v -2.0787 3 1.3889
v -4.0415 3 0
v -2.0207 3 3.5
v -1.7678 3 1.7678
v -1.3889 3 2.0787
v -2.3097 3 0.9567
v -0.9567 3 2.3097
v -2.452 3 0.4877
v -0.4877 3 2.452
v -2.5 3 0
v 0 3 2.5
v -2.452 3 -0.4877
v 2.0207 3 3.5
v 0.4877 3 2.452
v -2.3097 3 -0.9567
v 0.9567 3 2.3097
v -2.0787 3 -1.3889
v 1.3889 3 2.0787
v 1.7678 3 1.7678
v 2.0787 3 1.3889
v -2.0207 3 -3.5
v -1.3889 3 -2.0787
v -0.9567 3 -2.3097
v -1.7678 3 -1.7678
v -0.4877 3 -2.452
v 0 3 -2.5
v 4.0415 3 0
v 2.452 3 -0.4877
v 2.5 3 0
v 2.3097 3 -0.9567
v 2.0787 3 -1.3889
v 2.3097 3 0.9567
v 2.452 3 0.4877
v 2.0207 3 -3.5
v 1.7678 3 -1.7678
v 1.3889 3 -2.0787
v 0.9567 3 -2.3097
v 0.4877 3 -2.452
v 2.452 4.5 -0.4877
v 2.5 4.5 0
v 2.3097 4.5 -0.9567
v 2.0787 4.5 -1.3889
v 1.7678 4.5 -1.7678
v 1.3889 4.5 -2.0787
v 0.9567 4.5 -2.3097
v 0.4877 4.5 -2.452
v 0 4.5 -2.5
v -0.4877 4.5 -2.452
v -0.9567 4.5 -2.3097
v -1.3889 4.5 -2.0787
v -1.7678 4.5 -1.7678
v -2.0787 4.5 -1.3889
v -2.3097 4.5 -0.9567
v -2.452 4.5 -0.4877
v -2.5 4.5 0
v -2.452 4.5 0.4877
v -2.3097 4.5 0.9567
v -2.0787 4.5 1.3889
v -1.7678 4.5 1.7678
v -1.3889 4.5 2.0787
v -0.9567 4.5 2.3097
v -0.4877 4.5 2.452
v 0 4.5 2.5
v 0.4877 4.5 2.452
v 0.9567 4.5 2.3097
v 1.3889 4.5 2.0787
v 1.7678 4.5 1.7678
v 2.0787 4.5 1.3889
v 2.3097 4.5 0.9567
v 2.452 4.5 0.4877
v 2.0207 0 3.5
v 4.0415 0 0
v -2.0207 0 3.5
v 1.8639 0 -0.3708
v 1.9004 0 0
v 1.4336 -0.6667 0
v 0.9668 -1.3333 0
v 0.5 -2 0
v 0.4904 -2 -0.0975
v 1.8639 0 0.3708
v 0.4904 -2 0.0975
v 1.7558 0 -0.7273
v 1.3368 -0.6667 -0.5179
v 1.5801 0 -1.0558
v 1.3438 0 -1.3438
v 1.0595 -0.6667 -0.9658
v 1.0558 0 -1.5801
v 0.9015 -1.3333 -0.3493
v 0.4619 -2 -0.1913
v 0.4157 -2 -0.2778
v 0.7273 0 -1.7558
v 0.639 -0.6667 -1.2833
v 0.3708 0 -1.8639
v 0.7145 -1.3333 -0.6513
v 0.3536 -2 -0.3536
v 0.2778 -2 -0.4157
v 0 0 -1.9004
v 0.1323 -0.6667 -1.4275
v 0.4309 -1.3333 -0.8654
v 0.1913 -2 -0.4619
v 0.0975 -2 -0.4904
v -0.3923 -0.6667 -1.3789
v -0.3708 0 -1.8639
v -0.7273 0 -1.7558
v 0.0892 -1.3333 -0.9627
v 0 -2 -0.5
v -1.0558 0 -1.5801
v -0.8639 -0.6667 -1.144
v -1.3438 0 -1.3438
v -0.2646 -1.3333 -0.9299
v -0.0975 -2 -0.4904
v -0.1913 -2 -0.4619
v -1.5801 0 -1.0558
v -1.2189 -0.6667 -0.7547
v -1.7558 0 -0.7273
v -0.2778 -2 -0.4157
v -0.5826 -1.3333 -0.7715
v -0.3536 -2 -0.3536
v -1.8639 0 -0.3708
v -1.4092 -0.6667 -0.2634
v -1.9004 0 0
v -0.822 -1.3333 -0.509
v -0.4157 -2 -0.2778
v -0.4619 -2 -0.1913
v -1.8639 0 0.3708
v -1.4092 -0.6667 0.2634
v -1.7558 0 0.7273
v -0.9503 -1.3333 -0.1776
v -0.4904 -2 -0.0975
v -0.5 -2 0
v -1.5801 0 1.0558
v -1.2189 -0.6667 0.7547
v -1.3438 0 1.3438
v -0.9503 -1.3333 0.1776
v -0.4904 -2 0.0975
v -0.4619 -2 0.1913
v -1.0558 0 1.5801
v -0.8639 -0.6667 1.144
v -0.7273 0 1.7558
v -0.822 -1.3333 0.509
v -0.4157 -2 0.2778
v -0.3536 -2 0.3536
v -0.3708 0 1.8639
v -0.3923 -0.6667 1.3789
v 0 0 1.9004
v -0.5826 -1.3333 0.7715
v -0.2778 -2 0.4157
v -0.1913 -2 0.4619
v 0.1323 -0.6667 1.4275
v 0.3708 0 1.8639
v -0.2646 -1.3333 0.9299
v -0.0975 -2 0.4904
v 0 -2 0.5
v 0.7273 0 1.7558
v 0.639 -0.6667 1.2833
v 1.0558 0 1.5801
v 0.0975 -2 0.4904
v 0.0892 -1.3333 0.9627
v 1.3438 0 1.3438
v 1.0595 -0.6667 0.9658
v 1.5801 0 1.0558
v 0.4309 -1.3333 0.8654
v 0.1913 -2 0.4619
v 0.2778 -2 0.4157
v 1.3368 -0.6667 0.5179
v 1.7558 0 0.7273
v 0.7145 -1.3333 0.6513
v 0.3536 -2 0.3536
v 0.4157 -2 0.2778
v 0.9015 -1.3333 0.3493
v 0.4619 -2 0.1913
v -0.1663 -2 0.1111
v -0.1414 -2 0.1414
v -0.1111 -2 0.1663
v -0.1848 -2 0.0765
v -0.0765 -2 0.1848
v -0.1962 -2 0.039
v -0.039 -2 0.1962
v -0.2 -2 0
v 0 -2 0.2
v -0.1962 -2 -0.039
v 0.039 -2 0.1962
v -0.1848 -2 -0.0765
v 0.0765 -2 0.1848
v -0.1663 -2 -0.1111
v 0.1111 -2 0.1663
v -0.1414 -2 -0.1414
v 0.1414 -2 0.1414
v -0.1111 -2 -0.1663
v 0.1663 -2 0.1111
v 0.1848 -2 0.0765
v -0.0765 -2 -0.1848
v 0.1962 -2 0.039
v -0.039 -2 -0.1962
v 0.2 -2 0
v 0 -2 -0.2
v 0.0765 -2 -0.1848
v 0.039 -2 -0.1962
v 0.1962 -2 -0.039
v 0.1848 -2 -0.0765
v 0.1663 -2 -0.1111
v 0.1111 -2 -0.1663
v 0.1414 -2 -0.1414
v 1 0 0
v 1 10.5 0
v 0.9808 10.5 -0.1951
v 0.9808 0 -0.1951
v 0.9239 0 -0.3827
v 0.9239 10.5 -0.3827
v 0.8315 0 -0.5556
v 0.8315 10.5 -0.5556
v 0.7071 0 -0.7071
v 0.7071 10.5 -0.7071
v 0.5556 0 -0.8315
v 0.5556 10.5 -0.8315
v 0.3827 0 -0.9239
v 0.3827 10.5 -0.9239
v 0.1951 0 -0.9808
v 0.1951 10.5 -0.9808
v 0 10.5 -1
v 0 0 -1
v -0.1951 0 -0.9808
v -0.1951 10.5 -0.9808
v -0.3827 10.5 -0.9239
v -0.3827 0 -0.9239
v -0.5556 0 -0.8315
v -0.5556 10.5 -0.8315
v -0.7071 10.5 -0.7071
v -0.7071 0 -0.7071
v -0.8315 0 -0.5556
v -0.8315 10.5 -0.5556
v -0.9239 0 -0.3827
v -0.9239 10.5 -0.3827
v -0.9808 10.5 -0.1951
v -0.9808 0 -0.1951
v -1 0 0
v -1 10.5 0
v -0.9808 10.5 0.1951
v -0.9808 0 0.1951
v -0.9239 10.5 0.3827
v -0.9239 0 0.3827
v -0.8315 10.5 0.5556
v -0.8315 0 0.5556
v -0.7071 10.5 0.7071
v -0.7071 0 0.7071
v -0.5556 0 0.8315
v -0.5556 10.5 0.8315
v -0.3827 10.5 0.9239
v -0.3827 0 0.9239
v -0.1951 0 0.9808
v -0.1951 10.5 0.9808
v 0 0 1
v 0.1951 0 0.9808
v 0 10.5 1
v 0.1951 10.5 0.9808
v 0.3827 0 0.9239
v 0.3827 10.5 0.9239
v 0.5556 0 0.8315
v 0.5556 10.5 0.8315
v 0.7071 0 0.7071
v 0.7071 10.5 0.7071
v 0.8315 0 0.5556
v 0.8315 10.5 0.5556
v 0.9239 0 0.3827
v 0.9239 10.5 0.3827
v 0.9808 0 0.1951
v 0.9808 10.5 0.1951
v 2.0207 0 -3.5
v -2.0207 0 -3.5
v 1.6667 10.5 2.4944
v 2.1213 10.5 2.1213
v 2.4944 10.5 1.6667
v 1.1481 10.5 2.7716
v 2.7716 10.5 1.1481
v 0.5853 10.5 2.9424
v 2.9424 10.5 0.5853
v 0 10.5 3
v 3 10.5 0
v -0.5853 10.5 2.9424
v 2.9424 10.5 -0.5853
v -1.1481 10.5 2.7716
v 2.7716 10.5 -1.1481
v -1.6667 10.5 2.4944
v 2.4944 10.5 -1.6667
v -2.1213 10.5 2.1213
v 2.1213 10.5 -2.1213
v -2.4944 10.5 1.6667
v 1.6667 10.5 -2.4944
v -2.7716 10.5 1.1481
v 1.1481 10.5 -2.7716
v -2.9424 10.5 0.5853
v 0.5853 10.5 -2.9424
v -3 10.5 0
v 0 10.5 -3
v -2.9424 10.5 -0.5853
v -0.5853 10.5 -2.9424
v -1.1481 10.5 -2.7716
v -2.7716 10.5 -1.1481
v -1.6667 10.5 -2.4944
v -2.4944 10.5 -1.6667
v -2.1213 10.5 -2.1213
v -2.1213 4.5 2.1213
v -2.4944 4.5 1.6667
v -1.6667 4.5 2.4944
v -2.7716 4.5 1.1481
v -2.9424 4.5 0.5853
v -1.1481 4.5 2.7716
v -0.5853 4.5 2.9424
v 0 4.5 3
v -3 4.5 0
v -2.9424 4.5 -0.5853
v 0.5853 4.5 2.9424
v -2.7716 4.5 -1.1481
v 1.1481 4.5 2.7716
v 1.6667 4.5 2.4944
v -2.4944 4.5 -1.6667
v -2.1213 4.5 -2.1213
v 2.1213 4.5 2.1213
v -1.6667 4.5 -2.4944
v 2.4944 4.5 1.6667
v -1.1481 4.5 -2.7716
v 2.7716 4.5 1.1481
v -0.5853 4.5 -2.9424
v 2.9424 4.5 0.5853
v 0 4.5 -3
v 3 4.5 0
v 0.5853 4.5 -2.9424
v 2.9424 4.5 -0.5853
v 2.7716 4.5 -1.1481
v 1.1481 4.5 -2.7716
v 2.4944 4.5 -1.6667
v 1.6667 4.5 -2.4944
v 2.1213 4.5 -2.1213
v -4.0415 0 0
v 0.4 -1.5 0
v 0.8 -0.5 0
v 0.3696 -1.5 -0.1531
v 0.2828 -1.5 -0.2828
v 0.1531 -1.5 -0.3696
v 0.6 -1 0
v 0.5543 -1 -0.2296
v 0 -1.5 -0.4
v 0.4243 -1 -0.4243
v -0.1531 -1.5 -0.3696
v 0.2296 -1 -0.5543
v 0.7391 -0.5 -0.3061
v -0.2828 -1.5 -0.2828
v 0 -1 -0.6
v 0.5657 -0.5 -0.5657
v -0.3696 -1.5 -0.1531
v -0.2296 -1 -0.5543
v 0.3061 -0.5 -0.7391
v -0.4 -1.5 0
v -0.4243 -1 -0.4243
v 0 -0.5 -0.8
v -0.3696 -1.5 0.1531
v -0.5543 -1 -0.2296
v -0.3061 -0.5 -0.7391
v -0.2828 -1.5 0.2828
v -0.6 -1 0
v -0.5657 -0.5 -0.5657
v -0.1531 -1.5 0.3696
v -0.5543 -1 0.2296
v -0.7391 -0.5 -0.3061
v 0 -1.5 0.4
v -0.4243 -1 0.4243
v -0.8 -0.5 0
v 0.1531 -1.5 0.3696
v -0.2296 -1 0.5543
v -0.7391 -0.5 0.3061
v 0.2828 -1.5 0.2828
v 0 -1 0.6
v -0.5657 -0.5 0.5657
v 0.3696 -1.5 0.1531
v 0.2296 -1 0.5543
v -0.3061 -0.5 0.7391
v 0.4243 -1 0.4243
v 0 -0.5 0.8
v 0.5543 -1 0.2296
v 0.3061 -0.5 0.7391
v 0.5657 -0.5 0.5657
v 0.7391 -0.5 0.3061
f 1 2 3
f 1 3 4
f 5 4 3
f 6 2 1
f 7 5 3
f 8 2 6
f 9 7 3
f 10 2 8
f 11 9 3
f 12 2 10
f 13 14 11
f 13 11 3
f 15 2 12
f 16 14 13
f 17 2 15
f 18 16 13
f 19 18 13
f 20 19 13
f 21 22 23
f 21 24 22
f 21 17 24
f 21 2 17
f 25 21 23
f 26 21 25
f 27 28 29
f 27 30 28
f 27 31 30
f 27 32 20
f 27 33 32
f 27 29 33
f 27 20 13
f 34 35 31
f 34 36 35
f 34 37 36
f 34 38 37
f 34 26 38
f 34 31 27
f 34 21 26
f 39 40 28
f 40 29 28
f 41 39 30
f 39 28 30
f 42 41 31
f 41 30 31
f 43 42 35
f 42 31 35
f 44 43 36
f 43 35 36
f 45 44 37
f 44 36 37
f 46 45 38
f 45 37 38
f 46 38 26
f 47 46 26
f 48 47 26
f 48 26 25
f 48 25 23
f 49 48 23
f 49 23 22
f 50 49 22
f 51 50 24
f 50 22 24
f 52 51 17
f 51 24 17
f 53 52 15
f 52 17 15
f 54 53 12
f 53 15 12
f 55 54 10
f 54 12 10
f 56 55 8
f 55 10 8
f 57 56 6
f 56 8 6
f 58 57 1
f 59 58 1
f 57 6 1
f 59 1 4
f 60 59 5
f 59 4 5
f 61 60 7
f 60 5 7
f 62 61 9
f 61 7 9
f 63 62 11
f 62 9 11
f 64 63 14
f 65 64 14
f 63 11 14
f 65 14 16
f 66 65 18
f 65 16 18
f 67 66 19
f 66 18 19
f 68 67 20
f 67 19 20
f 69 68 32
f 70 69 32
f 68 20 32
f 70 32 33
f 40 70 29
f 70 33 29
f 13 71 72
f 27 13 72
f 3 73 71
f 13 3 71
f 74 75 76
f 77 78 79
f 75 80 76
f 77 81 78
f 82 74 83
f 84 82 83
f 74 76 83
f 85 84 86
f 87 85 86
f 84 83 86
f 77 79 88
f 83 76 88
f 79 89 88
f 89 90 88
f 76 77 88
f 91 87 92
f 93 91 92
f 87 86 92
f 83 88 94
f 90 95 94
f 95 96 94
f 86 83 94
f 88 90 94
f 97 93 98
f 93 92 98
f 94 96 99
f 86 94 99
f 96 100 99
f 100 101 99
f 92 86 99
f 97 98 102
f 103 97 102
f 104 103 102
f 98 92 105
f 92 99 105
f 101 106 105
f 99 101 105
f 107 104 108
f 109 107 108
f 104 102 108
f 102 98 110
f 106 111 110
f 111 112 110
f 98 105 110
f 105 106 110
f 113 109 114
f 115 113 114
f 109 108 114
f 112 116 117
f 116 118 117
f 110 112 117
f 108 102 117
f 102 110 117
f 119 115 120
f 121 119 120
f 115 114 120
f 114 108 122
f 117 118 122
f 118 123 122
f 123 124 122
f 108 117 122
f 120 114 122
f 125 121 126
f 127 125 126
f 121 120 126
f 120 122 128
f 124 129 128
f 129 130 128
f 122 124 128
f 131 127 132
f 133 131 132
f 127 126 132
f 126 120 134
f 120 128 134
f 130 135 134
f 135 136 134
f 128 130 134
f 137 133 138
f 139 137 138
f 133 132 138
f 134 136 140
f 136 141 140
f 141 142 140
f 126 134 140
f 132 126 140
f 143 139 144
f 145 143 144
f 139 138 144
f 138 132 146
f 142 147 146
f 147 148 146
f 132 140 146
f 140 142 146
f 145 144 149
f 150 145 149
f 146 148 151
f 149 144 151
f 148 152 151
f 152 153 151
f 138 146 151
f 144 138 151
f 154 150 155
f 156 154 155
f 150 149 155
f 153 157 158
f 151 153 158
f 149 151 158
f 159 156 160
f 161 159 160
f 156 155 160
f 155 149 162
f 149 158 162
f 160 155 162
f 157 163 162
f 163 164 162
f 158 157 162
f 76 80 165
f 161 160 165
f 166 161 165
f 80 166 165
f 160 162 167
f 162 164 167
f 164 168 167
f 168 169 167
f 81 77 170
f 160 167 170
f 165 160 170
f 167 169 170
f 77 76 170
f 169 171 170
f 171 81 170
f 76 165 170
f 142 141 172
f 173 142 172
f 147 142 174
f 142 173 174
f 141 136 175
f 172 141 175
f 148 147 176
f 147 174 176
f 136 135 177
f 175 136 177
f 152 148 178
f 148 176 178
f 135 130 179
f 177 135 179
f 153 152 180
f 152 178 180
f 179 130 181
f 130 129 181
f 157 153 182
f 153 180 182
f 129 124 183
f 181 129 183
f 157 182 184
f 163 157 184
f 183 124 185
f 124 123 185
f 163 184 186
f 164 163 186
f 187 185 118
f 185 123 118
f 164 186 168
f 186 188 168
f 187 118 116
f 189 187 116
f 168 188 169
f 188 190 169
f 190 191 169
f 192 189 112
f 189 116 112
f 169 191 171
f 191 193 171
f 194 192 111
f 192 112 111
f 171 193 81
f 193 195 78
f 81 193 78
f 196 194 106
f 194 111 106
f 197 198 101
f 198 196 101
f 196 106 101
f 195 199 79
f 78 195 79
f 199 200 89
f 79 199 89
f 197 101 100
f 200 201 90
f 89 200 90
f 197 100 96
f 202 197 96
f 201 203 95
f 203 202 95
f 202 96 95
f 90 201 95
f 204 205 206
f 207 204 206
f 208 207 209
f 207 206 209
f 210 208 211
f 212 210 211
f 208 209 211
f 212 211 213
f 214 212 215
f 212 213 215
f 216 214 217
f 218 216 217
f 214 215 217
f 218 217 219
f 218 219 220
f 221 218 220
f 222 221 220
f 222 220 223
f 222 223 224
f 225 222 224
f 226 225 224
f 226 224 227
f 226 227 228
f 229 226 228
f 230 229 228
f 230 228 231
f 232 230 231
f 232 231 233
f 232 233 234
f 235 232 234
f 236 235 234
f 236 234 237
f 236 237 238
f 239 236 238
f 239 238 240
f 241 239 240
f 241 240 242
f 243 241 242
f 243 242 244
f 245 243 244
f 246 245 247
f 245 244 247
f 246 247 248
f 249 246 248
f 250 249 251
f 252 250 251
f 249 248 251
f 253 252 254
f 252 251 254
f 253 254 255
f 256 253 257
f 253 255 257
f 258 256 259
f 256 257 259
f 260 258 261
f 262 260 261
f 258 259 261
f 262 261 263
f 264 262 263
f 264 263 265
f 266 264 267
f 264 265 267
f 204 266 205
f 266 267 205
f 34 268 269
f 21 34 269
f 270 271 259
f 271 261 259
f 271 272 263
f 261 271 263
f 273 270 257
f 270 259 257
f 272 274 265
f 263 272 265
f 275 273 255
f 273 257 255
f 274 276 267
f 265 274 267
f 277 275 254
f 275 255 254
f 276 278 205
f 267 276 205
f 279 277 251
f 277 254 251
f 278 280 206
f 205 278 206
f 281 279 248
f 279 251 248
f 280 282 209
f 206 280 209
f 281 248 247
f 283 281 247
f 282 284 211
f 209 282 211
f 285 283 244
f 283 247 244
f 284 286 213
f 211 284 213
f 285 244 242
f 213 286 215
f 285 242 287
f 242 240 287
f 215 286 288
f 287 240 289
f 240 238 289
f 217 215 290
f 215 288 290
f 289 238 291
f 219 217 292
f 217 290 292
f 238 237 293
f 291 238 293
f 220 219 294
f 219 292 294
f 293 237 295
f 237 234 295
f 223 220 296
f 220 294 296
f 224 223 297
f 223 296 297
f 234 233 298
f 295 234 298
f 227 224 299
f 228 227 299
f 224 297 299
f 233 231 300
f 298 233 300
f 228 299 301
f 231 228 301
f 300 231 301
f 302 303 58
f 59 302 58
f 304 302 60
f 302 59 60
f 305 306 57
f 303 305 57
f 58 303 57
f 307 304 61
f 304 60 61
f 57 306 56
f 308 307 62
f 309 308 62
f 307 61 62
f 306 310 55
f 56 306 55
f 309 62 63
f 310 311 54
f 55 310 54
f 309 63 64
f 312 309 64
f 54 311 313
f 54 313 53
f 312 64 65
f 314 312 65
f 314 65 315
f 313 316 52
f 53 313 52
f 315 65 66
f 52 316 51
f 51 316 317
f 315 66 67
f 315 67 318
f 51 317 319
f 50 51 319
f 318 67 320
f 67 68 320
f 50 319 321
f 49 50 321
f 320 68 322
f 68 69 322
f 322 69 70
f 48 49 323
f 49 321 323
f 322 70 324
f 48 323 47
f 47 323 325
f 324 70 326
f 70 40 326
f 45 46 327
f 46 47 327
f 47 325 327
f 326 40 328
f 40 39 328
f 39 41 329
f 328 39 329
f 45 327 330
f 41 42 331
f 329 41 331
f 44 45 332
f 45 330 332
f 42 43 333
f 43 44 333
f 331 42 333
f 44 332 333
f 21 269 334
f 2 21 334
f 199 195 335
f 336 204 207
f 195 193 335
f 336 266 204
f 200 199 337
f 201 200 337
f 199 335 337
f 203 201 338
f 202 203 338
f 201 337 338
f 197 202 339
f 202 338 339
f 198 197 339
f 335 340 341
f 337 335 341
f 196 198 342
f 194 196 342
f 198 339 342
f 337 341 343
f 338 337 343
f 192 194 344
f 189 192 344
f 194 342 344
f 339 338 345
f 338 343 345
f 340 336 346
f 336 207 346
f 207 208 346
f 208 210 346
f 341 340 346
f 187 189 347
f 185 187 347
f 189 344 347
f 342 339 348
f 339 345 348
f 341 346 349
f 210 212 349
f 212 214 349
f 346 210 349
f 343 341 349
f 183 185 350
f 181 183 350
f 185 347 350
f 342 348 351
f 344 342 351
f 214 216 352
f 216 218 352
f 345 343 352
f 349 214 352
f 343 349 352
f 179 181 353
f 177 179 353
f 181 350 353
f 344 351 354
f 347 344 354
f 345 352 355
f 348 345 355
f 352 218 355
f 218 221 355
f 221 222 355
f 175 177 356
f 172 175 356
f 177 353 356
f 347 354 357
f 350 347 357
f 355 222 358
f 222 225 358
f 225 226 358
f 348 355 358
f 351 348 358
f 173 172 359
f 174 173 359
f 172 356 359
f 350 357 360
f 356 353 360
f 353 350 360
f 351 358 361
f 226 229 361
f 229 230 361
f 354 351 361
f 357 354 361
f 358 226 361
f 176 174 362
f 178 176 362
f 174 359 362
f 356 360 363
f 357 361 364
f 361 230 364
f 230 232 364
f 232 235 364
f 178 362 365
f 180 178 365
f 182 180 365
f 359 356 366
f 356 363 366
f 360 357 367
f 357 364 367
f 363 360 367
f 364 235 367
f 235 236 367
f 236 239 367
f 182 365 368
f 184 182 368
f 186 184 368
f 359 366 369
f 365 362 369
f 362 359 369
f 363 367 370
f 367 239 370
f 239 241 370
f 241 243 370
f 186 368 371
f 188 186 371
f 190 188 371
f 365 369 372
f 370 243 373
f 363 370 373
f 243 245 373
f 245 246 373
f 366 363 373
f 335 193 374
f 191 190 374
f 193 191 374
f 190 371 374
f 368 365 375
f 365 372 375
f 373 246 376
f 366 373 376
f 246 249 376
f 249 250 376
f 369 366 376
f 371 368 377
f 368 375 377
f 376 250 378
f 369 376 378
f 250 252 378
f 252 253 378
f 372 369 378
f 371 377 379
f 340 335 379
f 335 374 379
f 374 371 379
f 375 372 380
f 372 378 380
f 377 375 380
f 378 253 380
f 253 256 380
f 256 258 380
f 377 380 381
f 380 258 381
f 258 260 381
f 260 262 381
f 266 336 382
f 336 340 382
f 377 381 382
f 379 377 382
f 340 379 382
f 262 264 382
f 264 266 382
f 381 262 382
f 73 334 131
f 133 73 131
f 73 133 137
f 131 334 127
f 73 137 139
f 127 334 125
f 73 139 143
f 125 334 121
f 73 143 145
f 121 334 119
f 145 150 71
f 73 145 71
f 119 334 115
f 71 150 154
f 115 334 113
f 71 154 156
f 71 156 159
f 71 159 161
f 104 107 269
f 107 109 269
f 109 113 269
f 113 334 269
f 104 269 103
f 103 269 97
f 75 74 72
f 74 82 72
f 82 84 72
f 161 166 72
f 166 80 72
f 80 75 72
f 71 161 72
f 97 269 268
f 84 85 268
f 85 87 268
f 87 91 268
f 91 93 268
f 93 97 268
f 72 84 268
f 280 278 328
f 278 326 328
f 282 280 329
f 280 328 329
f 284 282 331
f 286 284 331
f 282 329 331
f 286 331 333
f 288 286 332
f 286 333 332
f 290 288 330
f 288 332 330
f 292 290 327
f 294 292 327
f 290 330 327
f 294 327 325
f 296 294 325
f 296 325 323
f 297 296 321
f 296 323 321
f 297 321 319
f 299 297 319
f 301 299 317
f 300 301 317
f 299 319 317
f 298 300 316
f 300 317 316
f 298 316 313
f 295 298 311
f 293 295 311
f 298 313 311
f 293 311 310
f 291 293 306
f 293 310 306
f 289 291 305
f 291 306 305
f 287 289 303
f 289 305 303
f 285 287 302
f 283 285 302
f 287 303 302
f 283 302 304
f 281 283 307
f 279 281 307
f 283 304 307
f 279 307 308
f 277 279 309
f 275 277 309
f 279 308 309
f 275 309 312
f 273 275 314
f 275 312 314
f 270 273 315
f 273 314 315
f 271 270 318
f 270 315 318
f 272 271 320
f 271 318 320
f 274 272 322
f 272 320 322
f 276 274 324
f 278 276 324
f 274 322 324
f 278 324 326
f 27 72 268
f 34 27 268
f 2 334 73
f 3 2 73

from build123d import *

# Parameters (mm, degrees)
SKETCH1_R           = 1
BOSS_EXTRUDE1_DEPTH = 3


with BuildPart() as part:
    # Sketch1 → Boss-Extrude1 (new body)
    with BuildSketch(Plane(origin=(0, 0, 0), x_dir=(1, 0, 0), z_dir=(0, 1, 0))):
        Polygon((2.020725942, 3.5), (-2.020725942, 3.5), (-4.041451884, 0), (-2.020725942, -3.5), (2.020725942, -3.5), (4.041451884, 0), align=None)
        Circle(SKETCH1_R, mode=Mode.SUBTRACT)
    extrude(amount=BOSS_EXTRUDE1_DEPTH)

    # Sketch2 → Revolve1 (revolve)
    with BuildSketch(Plane.XY):
        Polygon((2.5, 3), (1, 3), (1, 10.5), (3, 10.5), (3, 4.5), (2.5, 4.5), align=None)
        Polygon((1, 0), (1.900415076, 0), (0.5, -2), (0.2, -2), align=None)
    revolve(axis=Axis((0, -2, 0), (0, 1, 0)))


solid = part.part
